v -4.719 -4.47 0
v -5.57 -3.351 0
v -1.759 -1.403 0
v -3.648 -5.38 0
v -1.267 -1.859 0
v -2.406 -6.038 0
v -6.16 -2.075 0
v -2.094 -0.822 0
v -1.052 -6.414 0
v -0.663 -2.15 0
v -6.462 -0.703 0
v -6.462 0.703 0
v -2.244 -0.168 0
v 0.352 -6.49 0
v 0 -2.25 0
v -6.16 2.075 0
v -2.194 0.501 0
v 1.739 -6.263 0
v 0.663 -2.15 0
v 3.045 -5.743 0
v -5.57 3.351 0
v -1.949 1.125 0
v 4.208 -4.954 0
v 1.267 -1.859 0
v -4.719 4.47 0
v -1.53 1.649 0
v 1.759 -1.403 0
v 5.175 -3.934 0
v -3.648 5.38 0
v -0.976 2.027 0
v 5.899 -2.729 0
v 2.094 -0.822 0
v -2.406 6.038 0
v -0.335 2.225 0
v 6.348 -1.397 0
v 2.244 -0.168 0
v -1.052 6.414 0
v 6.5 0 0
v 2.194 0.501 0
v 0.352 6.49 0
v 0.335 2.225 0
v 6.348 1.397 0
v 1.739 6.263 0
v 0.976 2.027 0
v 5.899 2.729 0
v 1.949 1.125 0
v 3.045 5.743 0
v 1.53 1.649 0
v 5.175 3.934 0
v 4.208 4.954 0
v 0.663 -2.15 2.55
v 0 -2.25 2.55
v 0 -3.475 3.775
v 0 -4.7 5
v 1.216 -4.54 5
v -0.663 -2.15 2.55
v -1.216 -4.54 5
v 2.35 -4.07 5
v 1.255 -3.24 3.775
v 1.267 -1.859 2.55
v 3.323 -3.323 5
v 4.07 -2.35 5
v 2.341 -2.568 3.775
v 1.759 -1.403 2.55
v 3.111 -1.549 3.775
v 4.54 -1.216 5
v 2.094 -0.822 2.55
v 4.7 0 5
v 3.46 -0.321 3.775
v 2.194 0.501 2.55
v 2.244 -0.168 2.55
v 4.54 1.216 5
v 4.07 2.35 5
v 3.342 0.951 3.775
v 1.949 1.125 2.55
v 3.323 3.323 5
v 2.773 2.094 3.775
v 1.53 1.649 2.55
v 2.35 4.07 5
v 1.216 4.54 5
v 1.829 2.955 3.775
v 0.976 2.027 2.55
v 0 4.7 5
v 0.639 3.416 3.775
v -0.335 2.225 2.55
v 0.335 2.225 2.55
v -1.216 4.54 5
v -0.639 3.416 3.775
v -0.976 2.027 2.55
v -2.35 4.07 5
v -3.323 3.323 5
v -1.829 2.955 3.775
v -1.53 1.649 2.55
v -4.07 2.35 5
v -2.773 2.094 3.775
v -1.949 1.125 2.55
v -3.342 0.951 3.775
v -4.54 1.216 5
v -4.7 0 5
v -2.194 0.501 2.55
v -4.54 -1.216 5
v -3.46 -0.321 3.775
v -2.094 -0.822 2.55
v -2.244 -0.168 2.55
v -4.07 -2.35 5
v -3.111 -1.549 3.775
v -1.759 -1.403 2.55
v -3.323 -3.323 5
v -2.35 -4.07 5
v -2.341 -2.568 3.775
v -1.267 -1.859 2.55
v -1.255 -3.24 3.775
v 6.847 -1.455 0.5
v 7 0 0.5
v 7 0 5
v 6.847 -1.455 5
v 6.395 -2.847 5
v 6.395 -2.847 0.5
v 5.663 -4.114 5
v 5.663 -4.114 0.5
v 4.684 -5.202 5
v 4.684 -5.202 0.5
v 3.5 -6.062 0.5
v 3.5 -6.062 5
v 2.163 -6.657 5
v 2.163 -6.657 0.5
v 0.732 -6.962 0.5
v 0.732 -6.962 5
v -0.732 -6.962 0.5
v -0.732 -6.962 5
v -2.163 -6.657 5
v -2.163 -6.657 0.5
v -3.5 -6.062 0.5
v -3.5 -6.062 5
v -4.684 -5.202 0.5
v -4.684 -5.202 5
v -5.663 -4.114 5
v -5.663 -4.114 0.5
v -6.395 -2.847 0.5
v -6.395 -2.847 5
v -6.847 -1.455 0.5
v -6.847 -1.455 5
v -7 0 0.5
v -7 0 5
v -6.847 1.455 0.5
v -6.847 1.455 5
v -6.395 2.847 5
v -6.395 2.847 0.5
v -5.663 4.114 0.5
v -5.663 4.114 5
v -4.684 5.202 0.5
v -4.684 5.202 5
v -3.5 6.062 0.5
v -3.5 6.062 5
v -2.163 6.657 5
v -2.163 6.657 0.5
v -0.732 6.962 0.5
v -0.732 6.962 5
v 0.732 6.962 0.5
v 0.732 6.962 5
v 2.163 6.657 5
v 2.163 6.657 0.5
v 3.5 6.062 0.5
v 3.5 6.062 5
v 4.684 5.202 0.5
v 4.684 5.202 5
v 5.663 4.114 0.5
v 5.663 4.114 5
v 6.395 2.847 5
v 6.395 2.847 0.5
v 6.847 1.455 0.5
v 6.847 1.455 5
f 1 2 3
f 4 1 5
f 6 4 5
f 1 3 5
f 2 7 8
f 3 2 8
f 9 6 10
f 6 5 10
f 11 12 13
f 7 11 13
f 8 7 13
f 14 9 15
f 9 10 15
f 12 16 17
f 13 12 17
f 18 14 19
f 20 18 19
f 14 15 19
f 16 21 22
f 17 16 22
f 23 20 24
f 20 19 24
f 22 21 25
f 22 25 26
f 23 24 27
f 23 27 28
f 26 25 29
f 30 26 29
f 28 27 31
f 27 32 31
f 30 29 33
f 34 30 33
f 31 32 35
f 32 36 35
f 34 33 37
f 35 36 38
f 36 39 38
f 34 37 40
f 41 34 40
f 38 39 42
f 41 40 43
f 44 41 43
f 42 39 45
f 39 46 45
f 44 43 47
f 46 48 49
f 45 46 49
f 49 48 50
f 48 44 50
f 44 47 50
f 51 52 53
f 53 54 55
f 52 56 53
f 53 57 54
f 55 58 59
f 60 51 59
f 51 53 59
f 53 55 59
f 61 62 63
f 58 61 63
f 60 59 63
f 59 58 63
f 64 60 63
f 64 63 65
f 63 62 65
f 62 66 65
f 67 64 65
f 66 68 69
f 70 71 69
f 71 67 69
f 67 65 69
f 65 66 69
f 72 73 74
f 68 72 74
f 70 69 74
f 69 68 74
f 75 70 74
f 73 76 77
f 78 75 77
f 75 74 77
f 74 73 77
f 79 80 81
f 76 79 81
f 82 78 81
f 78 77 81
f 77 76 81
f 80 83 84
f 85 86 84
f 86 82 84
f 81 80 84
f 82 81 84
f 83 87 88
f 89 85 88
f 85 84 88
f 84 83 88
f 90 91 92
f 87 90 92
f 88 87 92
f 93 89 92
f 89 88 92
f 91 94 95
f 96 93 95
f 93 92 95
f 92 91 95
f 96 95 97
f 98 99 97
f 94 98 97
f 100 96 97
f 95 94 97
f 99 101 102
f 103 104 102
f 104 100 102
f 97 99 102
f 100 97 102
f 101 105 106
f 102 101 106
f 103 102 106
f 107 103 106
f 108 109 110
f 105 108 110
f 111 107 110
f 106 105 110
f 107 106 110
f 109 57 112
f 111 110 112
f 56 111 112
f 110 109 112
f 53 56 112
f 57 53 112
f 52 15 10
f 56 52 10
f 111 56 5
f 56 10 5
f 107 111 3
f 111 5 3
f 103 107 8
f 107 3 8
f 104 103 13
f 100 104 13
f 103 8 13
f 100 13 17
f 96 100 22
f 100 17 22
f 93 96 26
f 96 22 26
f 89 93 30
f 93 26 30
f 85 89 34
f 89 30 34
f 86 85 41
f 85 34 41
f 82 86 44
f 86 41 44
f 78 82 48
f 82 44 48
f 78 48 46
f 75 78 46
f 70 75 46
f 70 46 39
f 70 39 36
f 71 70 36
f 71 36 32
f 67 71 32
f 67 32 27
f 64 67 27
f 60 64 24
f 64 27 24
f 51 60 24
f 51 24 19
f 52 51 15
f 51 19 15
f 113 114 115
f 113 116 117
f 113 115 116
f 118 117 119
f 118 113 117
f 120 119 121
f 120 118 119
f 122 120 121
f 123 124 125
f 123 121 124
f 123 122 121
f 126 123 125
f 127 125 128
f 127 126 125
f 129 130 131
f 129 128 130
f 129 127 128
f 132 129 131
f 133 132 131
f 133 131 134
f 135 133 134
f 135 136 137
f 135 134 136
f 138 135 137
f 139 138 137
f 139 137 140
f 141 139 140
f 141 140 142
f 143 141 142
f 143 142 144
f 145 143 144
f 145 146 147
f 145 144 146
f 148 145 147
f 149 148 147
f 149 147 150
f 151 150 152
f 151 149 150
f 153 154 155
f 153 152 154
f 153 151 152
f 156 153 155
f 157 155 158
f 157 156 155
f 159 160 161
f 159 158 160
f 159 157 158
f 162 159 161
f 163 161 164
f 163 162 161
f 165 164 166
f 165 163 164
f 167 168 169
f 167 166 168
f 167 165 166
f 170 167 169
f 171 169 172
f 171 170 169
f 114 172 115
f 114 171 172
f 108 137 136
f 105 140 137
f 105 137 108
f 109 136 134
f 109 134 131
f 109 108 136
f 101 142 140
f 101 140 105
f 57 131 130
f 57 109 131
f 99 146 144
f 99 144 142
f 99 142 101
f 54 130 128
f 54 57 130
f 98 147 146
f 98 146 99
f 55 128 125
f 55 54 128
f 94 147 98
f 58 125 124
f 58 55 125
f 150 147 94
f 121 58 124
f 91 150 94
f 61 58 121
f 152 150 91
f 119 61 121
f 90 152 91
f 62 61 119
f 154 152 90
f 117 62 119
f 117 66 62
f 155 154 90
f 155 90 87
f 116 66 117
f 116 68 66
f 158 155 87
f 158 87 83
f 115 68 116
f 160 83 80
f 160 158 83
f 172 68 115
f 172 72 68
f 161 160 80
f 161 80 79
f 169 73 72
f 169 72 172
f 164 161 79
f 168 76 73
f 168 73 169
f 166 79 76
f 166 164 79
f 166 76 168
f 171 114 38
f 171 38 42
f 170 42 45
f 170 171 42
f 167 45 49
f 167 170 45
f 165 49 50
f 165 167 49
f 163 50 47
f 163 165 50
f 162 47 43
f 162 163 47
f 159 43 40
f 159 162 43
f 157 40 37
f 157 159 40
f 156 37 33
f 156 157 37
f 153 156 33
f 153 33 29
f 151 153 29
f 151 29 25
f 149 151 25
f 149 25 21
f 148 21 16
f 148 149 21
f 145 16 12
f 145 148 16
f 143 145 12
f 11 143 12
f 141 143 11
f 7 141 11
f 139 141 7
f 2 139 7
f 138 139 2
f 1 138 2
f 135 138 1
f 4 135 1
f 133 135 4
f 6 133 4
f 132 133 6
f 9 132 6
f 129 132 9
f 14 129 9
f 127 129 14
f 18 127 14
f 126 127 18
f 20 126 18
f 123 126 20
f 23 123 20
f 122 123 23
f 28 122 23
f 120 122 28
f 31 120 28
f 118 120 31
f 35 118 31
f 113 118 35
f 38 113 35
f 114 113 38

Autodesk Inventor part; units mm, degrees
ref_plane "YZ Plane" through (0, 0, 0) normal (1, 0, 0) x (0, 1, 0)
ref_plane "XZ Plane" through (0, 0, 0) normal (0, 1, 0) x (-1, 0, 0)
ref_plane "XY Plane" through (0, 0, 0) normal (0, 0, 1) x (1, 0, 0)
sketch "Sketch1" plane through (0, 0, 0) normal (0, 0, 1) x (1, 0, 0)
  circle A0 centre (0, 0) radius 7
  dimension "d0" = 14
extrude "Extrusion1" add sketch "Sketch1" along normal blind 5
sketch "Sketch2" plane through (0, 0, 5) normal (0, 0, 1) x (1, 0, 0)
  point P0 (0, 0)
  point P1 (0, 0)
hole "Hole1" at (0, 0, 5) direction (0, 0, -1) diameter 4.5 end through all countersink diameter 9.4 countersink angle 90 clearance for "Flat Head Machine Screw" size "M4" standard "Ansi Metric M Profile"
chamfer "Chamfer1" distance 0.5 angle 45 1 edges at (-7, 0, 0)
properties part number "Top_Lever End Piece" material "Stainless Steel"
